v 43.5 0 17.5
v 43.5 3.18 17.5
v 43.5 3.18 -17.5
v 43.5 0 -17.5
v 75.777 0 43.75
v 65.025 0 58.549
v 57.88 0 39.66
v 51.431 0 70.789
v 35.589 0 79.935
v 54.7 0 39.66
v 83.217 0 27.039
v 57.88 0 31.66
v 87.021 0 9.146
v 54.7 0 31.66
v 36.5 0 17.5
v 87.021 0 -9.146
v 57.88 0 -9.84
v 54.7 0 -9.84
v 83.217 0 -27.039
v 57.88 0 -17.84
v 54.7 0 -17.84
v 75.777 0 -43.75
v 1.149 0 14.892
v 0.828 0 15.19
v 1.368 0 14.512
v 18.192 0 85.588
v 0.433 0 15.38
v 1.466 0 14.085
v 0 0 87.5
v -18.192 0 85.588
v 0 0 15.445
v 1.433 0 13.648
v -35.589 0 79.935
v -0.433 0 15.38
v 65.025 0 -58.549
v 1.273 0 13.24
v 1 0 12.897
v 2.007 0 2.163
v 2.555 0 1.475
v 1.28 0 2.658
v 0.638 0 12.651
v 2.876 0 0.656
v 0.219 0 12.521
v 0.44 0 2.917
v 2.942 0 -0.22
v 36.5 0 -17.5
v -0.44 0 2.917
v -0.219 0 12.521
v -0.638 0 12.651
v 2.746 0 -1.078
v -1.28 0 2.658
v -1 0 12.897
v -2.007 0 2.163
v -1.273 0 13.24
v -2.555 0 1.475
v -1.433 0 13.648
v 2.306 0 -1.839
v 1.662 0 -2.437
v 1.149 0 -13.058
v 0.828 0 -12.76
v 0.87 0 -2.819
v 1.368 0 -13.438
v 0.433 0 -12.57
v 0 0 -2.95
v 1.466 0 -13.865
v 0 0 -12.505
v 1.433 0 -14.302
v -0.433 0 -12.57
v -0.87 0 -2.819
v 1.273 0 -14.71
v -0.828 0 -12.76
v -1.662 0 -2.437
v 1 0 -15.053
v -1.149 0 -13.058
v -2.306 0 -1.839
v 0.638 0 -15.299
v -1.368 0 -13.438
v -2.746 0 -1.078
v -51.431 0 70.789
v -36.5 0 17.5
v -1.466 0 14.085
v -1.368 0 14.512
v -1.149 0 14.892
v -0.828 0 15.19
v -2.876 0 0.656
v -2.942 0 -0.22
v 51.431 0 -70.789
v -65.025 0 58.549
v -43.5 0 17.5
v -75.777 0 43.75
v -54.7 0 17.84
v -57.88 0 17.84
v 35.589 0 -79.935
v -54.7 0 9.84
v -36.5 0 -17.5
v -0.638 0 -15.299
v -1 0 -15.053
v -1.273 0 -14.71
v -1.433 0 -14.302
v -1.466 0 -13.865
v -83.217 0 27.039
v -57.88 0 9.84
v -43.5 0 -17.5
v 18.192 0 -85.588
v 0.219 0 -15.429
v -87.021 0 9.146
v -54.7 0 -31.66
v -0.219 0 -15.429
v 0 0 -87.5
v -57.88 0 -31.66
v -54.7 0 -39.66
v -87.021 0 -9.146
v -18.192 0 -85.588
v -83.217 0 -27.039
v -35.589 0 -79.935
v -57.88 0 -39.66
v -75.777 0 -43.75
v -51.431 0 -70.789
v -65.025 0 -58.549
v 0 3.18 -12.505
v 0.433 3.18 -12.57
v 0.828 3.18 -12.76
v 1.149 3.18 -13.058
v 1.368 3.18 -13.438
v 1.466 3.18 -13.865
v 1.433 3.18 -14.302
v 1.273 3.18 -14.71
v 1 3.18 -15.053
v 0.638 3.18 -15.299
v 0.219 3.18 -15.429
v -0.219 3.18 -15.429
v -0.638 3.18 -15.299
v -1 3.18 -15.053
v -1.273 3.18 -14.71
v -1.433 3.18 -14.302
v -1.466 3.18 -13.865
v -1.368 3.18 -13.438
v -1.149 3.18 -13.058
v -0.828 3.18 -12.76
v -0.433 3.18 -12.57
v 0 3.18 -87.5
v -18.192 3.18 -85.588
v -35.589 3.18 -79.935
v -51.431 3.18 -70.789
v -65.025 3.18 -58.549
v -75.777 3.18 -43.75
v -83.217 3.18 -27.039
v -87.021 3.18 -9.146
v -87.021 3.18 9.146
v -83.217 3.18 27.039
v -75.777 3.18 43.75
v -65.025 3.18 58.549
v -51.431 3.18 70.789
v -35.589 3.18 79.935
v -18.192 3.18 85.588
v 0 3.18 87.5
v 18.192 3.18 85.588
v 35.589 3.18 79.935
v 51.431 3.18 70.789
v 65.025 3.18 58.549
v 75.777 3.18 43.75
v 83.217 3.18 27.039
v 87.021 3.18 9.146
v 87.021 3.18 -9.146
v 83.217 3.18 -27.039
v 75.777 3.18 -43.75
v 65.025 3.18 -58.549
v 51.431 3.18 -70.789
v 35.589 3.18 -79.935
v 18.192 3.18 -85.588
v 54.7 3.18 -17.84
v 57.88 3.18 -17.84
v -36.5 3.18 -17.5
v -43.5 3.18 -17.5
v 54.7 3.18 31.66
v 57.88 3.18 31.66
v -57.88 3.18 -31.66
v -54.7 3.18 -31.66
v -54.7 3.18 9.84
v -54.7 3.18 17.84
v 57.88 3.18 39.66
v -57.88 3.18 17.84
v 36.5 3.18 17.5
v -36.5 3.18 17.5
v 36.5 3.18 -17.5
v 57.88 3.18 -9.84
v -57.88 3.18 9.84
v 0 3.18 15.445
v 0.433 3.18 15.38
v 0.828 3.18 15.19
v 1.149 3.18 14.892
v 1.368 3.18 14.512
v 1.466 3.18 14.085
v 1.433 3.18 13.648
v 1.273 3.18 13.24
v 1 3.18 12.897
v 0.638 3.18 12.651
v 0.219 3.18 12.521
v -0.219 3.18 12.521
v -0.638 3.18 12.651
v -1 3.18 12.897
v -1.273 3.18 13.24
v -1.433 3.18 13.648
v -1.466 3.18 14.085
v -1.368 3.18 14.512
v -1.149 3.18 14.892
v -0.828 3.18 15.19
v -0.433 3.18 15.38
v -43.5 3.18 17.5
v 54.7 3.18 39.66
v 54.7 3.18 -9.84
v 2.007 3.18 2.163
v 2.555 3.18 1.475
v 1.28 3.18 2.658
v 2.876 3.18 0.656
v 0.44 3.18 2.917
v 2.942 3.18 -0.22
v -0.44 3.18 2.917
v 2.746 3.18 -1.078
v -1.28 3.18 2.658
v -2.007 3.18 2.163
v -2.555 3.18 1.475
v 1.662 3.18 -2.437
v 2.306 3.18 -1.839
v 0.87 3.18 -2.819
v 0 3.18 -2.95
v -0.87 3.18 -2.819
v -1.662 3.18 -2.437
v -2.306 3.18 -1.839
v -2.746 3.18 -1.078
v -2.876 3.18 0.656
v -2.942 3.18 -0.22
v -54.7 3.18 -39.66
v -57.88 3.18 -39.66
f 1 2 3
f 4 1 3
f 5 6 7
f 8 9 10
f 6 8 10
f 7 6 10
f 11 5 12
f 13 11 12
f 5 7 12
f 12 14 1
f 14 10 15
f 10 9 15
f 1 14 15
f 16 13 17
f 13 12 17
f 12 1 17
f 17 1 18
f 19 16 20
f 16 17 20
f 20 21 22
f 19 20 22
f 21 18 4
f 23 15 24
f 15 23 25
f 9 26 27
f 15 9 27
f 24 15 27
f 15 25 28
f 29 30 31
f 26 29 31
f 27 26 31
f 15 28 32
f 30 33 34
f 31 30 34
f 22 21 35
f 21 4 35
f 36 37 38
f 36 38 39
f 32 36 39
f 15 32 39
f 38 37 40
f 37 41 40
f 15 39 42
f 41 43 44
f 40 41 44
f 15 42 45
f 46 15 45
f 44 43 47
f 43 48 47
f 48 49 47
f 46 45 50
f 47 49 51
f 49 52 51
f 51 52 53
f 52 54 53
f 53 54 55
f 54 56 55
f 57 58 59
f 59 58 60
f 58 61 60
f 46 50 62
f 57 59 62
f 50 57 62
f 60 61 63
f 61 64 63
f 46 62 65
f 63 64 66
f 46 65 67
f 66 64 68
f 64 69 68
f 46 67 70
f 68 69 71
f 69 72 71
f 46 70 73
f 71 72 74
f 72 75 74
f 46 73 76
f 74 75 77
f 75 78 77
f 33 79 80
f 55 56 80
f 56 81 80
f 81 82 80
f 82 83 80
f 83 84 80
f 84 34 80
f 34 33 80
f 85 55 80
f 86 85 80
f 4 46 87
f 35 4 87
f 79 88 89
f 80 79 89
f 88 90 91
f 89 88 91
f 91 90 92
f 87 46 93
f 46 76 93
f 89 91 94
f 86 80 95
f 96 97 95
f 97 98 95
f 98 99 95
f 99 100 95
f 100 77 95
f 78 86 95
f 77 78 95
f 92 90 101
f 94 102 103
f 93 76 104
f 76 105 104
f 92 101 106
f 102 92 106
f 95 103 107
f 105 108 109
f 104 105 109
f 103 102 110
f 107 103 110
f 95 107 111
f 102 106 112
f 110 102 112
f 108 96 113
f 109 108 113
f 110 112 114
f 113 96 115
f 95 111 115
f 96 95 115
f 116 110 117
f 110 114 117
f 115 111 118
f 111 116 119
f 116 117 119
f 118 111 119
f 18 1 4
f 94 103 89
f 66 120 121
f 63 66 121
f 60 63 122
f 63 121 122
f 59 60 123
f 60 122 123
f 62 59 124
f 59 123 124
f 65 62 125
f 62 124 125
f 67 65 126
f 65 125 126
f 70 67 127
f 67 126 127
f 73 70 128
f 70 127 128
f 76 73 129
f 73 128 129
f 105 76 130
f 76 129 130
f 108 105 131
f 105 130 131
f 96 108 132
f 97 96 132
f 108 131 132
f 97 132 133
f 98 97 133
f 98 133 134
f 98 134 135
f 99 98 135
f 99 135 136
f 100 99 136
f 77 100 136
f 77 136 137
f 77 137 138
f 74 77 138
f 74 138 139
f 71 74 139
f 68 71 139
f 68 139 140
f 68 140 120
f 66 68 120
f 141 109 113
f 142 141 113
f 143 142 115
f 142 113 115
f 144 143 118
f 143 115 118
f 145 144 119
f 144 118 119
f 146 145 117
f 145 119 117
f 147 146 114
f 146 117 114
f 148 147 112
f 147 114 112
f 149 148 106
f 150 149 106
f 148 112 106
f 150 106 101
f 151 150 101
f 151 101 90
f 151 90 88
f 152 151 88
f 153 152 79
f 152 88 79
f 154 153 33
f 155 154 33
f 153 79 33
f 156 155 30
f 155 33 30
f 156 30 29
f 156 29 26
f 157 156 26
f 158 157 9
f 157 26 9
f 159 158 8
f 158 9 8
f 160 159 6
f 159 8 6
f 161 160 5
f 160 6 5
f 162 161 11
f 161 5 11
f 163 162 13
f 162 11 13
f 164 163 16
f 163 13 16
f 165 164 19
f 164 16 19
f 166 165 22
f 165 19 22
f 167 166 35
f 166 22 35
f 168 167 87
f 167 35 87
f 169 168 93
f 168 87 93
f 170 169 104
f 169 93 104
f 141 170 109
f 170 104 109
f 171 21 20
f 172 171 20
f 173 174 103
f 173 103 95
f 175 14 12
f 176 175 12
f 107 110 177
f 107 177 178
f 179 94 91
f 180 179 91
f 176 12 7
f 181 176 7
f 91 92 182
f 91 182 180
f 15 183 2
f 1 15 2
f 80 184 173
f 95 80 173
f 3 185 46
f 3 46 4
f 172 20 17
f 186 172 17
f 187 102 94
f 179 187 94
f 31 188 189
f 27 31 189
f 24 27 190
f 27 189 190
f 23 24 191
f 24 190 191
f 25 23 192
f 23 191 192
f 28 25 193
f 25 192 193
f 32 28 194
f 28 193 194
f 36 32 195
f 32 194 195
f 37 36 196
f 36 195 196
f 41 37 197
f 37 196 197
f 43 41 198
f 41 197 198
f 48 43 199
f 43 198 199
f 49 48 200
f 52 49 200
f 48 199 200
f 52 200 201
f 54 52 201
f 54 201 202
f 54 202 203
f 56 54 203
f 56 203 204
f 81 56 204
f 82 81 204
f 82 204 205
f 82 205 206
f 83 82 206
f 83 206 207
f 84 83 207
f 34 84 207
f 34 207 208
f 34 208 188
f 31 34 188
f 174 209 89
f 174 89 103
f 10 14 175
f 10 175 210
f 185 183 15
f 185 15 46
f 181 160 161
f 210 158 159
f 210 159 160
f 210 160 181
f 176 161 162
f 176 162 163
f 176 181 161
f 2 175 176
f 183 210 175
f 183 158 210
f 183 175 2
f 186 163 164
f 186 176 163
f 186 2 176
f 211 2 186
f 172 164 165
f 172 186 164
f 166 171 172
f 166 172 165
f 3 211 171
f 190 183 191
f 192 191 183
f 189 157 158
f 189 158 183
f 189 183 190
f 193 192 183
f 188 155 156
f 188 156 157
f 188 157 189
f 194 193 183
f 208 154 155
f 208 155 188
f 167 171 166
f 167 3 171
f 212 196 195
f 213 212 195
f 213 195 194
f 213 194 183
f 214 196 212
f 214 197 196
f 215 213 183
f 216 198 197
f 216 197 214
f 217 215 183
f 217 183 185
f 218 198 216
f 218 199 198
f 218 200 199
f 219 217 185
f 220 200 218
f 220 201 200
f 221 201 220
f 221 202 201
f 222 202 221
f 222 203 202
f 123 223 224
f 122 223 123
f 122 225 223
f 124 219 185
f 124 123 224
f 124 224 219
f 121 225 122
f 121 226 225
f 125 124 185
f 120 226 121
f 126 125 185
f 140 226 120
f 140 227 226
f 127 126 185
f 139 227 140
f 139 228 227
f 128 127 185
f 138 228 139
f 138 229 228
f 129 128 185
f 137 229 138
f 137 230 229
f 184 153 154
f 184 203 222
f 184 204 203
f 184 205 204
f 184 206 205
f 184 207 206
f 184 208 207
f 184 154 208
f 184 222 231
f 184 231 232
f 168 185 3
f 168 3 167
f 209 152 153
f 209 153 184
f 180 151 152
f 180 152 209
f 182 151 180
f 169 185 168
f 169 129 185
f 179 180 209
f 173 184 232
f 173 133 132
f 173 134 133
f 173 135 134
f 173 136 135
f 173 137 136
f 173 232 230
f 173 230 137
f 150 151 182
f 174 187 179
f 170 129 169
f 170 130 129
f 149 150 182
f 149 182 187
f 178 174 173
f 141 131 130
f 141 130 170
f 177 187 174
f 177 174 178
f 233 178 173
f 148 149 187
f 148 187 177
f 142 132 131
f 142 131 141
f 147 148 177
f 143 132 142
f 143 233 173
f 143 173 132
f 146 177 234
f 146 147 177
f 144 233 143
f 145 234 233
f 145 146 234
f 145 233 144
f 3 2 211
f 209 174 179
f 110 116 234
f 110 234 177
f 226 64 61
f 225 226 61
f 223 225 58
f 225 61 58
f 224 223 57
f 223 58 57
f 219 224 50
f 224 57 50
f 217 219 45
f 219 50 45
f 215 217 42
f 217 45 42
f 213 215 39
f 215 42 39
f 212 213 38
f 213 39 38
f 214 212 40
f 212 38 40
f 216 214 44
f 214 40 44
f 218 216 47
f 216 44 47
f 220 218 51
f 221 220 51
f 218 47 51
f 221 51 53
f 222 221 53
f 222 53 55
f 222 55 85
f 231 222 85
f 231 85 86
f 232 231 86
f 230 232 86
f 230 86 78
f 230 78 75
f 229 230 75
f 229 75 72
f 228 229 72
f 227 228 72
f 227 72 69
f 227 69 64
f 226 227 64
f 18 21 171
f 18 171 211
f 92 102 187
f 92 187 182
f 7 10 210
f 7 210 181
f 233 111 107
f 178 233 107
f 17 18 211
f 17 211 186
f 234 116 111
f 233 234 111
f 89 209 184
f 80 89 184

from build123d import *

# Parameters (mm, degrees)
SKETCH1_R           = 87.5
BOSS_EXTRUDE1_DEPTH = 3.18
SKETCH2_W           = 7
SKETCH2_H           = 35
CUT_EXTRUDE1_DEPTH  = 3.18
SKETCH7_R           = 2.95
CUT_EXTRUDE5_DEPTH  = 10
SKETCH8_R           = 1.47
CUT_EXTRUDE6_DEPTH  = 124.78454023
SKETCH3_W           = 3.18
SKETCH3_H           = 8
CUT_EXTRUDE13_DEPTH = 124.78454023


with BuildPart() as part:
    # Sketch1 → Boss-Extrude1 (new body)
    with BuildSketch(Plane(origin=(0, 0, 0), x_dir=(1, 0, 0), z_dir=(0, 1, 0))):
        with Locations(Location((0, 0, 0), (0, 0, 90))):
            Circle(SKETCH1_R)
    extrude(amount=BOSS_EXTRUDE1_DEPTH)

    # Sketch2 → Cut-Extrude1 (cut)
    with BuildSketch(Plane(origin=(0, 3.18, 0), x_dir=(1, 0, 0), z_dir=(0, 1, 0))):
        with Locations((-40, 0)):
            Rectangle(SKETCH2_W, SKETCH2_H)
        with Locations((40, 0)):
            Rectangle(SKETCH2_W, SKETCH2_H)
    extrude(amount=-CUT_EXTRUDE1_DEPTH, mode=Mode.SUBTRACT)

    # Sketch7 → Cut-Extrude5 (cut)
    with BuildSketch(Plane.XZ):
        with Locations(Location((0, 0, 0), (0, 0, 270))):
            Circle(SKETCH7_R)
    extrude(amount=-CUT_EXTRUDE5_DEPTH, mode=Mode.SUBTRACT)

    # Sketch8 → Cut-Extrude6 (cut, through all)
    with BuildSketch(Plane(origin=(0, 3.18, 0), x_dir=(1, 0, 0), z_dir=(0, 1, 0))):
        with Locations(Location((0, 13.975, 0), (0, 0, 270))):
            Circle(SKETCH8_R)
        with Locations(Location((0, -13.975, 0), (0, 0, 270))):
            Circle(SKETCH8_R)
    extrude(amount=-CUT_EXTRUDE6_DEPTH, mode=Mode.SUBTRACT)

    # Sketch3 → Cut-Extrude13 (cut, through all)
    with BuildSketch(Plane.XZ):
        with Locations((56.29, -13.84)):
            Rectangle(SKETCH3_W, SKETCH3_H)
        with Locations((56.29, 35.66)):
            Rectangle(SKETCH3_W, SKETCH3_H)
        with Locations((-56.29, 13.84)):
            Rectangle(SKETCH3_W, SKETCH3_H)
        with Locations((-56.29, -35.66)):
            Rectangle(SKETCH3_W, SKETCH3_H)
    extrude(amount=-CUT_EXTRUDE13_DEPTH, mode=Mode.SUBTRACT)


solid = part.part
